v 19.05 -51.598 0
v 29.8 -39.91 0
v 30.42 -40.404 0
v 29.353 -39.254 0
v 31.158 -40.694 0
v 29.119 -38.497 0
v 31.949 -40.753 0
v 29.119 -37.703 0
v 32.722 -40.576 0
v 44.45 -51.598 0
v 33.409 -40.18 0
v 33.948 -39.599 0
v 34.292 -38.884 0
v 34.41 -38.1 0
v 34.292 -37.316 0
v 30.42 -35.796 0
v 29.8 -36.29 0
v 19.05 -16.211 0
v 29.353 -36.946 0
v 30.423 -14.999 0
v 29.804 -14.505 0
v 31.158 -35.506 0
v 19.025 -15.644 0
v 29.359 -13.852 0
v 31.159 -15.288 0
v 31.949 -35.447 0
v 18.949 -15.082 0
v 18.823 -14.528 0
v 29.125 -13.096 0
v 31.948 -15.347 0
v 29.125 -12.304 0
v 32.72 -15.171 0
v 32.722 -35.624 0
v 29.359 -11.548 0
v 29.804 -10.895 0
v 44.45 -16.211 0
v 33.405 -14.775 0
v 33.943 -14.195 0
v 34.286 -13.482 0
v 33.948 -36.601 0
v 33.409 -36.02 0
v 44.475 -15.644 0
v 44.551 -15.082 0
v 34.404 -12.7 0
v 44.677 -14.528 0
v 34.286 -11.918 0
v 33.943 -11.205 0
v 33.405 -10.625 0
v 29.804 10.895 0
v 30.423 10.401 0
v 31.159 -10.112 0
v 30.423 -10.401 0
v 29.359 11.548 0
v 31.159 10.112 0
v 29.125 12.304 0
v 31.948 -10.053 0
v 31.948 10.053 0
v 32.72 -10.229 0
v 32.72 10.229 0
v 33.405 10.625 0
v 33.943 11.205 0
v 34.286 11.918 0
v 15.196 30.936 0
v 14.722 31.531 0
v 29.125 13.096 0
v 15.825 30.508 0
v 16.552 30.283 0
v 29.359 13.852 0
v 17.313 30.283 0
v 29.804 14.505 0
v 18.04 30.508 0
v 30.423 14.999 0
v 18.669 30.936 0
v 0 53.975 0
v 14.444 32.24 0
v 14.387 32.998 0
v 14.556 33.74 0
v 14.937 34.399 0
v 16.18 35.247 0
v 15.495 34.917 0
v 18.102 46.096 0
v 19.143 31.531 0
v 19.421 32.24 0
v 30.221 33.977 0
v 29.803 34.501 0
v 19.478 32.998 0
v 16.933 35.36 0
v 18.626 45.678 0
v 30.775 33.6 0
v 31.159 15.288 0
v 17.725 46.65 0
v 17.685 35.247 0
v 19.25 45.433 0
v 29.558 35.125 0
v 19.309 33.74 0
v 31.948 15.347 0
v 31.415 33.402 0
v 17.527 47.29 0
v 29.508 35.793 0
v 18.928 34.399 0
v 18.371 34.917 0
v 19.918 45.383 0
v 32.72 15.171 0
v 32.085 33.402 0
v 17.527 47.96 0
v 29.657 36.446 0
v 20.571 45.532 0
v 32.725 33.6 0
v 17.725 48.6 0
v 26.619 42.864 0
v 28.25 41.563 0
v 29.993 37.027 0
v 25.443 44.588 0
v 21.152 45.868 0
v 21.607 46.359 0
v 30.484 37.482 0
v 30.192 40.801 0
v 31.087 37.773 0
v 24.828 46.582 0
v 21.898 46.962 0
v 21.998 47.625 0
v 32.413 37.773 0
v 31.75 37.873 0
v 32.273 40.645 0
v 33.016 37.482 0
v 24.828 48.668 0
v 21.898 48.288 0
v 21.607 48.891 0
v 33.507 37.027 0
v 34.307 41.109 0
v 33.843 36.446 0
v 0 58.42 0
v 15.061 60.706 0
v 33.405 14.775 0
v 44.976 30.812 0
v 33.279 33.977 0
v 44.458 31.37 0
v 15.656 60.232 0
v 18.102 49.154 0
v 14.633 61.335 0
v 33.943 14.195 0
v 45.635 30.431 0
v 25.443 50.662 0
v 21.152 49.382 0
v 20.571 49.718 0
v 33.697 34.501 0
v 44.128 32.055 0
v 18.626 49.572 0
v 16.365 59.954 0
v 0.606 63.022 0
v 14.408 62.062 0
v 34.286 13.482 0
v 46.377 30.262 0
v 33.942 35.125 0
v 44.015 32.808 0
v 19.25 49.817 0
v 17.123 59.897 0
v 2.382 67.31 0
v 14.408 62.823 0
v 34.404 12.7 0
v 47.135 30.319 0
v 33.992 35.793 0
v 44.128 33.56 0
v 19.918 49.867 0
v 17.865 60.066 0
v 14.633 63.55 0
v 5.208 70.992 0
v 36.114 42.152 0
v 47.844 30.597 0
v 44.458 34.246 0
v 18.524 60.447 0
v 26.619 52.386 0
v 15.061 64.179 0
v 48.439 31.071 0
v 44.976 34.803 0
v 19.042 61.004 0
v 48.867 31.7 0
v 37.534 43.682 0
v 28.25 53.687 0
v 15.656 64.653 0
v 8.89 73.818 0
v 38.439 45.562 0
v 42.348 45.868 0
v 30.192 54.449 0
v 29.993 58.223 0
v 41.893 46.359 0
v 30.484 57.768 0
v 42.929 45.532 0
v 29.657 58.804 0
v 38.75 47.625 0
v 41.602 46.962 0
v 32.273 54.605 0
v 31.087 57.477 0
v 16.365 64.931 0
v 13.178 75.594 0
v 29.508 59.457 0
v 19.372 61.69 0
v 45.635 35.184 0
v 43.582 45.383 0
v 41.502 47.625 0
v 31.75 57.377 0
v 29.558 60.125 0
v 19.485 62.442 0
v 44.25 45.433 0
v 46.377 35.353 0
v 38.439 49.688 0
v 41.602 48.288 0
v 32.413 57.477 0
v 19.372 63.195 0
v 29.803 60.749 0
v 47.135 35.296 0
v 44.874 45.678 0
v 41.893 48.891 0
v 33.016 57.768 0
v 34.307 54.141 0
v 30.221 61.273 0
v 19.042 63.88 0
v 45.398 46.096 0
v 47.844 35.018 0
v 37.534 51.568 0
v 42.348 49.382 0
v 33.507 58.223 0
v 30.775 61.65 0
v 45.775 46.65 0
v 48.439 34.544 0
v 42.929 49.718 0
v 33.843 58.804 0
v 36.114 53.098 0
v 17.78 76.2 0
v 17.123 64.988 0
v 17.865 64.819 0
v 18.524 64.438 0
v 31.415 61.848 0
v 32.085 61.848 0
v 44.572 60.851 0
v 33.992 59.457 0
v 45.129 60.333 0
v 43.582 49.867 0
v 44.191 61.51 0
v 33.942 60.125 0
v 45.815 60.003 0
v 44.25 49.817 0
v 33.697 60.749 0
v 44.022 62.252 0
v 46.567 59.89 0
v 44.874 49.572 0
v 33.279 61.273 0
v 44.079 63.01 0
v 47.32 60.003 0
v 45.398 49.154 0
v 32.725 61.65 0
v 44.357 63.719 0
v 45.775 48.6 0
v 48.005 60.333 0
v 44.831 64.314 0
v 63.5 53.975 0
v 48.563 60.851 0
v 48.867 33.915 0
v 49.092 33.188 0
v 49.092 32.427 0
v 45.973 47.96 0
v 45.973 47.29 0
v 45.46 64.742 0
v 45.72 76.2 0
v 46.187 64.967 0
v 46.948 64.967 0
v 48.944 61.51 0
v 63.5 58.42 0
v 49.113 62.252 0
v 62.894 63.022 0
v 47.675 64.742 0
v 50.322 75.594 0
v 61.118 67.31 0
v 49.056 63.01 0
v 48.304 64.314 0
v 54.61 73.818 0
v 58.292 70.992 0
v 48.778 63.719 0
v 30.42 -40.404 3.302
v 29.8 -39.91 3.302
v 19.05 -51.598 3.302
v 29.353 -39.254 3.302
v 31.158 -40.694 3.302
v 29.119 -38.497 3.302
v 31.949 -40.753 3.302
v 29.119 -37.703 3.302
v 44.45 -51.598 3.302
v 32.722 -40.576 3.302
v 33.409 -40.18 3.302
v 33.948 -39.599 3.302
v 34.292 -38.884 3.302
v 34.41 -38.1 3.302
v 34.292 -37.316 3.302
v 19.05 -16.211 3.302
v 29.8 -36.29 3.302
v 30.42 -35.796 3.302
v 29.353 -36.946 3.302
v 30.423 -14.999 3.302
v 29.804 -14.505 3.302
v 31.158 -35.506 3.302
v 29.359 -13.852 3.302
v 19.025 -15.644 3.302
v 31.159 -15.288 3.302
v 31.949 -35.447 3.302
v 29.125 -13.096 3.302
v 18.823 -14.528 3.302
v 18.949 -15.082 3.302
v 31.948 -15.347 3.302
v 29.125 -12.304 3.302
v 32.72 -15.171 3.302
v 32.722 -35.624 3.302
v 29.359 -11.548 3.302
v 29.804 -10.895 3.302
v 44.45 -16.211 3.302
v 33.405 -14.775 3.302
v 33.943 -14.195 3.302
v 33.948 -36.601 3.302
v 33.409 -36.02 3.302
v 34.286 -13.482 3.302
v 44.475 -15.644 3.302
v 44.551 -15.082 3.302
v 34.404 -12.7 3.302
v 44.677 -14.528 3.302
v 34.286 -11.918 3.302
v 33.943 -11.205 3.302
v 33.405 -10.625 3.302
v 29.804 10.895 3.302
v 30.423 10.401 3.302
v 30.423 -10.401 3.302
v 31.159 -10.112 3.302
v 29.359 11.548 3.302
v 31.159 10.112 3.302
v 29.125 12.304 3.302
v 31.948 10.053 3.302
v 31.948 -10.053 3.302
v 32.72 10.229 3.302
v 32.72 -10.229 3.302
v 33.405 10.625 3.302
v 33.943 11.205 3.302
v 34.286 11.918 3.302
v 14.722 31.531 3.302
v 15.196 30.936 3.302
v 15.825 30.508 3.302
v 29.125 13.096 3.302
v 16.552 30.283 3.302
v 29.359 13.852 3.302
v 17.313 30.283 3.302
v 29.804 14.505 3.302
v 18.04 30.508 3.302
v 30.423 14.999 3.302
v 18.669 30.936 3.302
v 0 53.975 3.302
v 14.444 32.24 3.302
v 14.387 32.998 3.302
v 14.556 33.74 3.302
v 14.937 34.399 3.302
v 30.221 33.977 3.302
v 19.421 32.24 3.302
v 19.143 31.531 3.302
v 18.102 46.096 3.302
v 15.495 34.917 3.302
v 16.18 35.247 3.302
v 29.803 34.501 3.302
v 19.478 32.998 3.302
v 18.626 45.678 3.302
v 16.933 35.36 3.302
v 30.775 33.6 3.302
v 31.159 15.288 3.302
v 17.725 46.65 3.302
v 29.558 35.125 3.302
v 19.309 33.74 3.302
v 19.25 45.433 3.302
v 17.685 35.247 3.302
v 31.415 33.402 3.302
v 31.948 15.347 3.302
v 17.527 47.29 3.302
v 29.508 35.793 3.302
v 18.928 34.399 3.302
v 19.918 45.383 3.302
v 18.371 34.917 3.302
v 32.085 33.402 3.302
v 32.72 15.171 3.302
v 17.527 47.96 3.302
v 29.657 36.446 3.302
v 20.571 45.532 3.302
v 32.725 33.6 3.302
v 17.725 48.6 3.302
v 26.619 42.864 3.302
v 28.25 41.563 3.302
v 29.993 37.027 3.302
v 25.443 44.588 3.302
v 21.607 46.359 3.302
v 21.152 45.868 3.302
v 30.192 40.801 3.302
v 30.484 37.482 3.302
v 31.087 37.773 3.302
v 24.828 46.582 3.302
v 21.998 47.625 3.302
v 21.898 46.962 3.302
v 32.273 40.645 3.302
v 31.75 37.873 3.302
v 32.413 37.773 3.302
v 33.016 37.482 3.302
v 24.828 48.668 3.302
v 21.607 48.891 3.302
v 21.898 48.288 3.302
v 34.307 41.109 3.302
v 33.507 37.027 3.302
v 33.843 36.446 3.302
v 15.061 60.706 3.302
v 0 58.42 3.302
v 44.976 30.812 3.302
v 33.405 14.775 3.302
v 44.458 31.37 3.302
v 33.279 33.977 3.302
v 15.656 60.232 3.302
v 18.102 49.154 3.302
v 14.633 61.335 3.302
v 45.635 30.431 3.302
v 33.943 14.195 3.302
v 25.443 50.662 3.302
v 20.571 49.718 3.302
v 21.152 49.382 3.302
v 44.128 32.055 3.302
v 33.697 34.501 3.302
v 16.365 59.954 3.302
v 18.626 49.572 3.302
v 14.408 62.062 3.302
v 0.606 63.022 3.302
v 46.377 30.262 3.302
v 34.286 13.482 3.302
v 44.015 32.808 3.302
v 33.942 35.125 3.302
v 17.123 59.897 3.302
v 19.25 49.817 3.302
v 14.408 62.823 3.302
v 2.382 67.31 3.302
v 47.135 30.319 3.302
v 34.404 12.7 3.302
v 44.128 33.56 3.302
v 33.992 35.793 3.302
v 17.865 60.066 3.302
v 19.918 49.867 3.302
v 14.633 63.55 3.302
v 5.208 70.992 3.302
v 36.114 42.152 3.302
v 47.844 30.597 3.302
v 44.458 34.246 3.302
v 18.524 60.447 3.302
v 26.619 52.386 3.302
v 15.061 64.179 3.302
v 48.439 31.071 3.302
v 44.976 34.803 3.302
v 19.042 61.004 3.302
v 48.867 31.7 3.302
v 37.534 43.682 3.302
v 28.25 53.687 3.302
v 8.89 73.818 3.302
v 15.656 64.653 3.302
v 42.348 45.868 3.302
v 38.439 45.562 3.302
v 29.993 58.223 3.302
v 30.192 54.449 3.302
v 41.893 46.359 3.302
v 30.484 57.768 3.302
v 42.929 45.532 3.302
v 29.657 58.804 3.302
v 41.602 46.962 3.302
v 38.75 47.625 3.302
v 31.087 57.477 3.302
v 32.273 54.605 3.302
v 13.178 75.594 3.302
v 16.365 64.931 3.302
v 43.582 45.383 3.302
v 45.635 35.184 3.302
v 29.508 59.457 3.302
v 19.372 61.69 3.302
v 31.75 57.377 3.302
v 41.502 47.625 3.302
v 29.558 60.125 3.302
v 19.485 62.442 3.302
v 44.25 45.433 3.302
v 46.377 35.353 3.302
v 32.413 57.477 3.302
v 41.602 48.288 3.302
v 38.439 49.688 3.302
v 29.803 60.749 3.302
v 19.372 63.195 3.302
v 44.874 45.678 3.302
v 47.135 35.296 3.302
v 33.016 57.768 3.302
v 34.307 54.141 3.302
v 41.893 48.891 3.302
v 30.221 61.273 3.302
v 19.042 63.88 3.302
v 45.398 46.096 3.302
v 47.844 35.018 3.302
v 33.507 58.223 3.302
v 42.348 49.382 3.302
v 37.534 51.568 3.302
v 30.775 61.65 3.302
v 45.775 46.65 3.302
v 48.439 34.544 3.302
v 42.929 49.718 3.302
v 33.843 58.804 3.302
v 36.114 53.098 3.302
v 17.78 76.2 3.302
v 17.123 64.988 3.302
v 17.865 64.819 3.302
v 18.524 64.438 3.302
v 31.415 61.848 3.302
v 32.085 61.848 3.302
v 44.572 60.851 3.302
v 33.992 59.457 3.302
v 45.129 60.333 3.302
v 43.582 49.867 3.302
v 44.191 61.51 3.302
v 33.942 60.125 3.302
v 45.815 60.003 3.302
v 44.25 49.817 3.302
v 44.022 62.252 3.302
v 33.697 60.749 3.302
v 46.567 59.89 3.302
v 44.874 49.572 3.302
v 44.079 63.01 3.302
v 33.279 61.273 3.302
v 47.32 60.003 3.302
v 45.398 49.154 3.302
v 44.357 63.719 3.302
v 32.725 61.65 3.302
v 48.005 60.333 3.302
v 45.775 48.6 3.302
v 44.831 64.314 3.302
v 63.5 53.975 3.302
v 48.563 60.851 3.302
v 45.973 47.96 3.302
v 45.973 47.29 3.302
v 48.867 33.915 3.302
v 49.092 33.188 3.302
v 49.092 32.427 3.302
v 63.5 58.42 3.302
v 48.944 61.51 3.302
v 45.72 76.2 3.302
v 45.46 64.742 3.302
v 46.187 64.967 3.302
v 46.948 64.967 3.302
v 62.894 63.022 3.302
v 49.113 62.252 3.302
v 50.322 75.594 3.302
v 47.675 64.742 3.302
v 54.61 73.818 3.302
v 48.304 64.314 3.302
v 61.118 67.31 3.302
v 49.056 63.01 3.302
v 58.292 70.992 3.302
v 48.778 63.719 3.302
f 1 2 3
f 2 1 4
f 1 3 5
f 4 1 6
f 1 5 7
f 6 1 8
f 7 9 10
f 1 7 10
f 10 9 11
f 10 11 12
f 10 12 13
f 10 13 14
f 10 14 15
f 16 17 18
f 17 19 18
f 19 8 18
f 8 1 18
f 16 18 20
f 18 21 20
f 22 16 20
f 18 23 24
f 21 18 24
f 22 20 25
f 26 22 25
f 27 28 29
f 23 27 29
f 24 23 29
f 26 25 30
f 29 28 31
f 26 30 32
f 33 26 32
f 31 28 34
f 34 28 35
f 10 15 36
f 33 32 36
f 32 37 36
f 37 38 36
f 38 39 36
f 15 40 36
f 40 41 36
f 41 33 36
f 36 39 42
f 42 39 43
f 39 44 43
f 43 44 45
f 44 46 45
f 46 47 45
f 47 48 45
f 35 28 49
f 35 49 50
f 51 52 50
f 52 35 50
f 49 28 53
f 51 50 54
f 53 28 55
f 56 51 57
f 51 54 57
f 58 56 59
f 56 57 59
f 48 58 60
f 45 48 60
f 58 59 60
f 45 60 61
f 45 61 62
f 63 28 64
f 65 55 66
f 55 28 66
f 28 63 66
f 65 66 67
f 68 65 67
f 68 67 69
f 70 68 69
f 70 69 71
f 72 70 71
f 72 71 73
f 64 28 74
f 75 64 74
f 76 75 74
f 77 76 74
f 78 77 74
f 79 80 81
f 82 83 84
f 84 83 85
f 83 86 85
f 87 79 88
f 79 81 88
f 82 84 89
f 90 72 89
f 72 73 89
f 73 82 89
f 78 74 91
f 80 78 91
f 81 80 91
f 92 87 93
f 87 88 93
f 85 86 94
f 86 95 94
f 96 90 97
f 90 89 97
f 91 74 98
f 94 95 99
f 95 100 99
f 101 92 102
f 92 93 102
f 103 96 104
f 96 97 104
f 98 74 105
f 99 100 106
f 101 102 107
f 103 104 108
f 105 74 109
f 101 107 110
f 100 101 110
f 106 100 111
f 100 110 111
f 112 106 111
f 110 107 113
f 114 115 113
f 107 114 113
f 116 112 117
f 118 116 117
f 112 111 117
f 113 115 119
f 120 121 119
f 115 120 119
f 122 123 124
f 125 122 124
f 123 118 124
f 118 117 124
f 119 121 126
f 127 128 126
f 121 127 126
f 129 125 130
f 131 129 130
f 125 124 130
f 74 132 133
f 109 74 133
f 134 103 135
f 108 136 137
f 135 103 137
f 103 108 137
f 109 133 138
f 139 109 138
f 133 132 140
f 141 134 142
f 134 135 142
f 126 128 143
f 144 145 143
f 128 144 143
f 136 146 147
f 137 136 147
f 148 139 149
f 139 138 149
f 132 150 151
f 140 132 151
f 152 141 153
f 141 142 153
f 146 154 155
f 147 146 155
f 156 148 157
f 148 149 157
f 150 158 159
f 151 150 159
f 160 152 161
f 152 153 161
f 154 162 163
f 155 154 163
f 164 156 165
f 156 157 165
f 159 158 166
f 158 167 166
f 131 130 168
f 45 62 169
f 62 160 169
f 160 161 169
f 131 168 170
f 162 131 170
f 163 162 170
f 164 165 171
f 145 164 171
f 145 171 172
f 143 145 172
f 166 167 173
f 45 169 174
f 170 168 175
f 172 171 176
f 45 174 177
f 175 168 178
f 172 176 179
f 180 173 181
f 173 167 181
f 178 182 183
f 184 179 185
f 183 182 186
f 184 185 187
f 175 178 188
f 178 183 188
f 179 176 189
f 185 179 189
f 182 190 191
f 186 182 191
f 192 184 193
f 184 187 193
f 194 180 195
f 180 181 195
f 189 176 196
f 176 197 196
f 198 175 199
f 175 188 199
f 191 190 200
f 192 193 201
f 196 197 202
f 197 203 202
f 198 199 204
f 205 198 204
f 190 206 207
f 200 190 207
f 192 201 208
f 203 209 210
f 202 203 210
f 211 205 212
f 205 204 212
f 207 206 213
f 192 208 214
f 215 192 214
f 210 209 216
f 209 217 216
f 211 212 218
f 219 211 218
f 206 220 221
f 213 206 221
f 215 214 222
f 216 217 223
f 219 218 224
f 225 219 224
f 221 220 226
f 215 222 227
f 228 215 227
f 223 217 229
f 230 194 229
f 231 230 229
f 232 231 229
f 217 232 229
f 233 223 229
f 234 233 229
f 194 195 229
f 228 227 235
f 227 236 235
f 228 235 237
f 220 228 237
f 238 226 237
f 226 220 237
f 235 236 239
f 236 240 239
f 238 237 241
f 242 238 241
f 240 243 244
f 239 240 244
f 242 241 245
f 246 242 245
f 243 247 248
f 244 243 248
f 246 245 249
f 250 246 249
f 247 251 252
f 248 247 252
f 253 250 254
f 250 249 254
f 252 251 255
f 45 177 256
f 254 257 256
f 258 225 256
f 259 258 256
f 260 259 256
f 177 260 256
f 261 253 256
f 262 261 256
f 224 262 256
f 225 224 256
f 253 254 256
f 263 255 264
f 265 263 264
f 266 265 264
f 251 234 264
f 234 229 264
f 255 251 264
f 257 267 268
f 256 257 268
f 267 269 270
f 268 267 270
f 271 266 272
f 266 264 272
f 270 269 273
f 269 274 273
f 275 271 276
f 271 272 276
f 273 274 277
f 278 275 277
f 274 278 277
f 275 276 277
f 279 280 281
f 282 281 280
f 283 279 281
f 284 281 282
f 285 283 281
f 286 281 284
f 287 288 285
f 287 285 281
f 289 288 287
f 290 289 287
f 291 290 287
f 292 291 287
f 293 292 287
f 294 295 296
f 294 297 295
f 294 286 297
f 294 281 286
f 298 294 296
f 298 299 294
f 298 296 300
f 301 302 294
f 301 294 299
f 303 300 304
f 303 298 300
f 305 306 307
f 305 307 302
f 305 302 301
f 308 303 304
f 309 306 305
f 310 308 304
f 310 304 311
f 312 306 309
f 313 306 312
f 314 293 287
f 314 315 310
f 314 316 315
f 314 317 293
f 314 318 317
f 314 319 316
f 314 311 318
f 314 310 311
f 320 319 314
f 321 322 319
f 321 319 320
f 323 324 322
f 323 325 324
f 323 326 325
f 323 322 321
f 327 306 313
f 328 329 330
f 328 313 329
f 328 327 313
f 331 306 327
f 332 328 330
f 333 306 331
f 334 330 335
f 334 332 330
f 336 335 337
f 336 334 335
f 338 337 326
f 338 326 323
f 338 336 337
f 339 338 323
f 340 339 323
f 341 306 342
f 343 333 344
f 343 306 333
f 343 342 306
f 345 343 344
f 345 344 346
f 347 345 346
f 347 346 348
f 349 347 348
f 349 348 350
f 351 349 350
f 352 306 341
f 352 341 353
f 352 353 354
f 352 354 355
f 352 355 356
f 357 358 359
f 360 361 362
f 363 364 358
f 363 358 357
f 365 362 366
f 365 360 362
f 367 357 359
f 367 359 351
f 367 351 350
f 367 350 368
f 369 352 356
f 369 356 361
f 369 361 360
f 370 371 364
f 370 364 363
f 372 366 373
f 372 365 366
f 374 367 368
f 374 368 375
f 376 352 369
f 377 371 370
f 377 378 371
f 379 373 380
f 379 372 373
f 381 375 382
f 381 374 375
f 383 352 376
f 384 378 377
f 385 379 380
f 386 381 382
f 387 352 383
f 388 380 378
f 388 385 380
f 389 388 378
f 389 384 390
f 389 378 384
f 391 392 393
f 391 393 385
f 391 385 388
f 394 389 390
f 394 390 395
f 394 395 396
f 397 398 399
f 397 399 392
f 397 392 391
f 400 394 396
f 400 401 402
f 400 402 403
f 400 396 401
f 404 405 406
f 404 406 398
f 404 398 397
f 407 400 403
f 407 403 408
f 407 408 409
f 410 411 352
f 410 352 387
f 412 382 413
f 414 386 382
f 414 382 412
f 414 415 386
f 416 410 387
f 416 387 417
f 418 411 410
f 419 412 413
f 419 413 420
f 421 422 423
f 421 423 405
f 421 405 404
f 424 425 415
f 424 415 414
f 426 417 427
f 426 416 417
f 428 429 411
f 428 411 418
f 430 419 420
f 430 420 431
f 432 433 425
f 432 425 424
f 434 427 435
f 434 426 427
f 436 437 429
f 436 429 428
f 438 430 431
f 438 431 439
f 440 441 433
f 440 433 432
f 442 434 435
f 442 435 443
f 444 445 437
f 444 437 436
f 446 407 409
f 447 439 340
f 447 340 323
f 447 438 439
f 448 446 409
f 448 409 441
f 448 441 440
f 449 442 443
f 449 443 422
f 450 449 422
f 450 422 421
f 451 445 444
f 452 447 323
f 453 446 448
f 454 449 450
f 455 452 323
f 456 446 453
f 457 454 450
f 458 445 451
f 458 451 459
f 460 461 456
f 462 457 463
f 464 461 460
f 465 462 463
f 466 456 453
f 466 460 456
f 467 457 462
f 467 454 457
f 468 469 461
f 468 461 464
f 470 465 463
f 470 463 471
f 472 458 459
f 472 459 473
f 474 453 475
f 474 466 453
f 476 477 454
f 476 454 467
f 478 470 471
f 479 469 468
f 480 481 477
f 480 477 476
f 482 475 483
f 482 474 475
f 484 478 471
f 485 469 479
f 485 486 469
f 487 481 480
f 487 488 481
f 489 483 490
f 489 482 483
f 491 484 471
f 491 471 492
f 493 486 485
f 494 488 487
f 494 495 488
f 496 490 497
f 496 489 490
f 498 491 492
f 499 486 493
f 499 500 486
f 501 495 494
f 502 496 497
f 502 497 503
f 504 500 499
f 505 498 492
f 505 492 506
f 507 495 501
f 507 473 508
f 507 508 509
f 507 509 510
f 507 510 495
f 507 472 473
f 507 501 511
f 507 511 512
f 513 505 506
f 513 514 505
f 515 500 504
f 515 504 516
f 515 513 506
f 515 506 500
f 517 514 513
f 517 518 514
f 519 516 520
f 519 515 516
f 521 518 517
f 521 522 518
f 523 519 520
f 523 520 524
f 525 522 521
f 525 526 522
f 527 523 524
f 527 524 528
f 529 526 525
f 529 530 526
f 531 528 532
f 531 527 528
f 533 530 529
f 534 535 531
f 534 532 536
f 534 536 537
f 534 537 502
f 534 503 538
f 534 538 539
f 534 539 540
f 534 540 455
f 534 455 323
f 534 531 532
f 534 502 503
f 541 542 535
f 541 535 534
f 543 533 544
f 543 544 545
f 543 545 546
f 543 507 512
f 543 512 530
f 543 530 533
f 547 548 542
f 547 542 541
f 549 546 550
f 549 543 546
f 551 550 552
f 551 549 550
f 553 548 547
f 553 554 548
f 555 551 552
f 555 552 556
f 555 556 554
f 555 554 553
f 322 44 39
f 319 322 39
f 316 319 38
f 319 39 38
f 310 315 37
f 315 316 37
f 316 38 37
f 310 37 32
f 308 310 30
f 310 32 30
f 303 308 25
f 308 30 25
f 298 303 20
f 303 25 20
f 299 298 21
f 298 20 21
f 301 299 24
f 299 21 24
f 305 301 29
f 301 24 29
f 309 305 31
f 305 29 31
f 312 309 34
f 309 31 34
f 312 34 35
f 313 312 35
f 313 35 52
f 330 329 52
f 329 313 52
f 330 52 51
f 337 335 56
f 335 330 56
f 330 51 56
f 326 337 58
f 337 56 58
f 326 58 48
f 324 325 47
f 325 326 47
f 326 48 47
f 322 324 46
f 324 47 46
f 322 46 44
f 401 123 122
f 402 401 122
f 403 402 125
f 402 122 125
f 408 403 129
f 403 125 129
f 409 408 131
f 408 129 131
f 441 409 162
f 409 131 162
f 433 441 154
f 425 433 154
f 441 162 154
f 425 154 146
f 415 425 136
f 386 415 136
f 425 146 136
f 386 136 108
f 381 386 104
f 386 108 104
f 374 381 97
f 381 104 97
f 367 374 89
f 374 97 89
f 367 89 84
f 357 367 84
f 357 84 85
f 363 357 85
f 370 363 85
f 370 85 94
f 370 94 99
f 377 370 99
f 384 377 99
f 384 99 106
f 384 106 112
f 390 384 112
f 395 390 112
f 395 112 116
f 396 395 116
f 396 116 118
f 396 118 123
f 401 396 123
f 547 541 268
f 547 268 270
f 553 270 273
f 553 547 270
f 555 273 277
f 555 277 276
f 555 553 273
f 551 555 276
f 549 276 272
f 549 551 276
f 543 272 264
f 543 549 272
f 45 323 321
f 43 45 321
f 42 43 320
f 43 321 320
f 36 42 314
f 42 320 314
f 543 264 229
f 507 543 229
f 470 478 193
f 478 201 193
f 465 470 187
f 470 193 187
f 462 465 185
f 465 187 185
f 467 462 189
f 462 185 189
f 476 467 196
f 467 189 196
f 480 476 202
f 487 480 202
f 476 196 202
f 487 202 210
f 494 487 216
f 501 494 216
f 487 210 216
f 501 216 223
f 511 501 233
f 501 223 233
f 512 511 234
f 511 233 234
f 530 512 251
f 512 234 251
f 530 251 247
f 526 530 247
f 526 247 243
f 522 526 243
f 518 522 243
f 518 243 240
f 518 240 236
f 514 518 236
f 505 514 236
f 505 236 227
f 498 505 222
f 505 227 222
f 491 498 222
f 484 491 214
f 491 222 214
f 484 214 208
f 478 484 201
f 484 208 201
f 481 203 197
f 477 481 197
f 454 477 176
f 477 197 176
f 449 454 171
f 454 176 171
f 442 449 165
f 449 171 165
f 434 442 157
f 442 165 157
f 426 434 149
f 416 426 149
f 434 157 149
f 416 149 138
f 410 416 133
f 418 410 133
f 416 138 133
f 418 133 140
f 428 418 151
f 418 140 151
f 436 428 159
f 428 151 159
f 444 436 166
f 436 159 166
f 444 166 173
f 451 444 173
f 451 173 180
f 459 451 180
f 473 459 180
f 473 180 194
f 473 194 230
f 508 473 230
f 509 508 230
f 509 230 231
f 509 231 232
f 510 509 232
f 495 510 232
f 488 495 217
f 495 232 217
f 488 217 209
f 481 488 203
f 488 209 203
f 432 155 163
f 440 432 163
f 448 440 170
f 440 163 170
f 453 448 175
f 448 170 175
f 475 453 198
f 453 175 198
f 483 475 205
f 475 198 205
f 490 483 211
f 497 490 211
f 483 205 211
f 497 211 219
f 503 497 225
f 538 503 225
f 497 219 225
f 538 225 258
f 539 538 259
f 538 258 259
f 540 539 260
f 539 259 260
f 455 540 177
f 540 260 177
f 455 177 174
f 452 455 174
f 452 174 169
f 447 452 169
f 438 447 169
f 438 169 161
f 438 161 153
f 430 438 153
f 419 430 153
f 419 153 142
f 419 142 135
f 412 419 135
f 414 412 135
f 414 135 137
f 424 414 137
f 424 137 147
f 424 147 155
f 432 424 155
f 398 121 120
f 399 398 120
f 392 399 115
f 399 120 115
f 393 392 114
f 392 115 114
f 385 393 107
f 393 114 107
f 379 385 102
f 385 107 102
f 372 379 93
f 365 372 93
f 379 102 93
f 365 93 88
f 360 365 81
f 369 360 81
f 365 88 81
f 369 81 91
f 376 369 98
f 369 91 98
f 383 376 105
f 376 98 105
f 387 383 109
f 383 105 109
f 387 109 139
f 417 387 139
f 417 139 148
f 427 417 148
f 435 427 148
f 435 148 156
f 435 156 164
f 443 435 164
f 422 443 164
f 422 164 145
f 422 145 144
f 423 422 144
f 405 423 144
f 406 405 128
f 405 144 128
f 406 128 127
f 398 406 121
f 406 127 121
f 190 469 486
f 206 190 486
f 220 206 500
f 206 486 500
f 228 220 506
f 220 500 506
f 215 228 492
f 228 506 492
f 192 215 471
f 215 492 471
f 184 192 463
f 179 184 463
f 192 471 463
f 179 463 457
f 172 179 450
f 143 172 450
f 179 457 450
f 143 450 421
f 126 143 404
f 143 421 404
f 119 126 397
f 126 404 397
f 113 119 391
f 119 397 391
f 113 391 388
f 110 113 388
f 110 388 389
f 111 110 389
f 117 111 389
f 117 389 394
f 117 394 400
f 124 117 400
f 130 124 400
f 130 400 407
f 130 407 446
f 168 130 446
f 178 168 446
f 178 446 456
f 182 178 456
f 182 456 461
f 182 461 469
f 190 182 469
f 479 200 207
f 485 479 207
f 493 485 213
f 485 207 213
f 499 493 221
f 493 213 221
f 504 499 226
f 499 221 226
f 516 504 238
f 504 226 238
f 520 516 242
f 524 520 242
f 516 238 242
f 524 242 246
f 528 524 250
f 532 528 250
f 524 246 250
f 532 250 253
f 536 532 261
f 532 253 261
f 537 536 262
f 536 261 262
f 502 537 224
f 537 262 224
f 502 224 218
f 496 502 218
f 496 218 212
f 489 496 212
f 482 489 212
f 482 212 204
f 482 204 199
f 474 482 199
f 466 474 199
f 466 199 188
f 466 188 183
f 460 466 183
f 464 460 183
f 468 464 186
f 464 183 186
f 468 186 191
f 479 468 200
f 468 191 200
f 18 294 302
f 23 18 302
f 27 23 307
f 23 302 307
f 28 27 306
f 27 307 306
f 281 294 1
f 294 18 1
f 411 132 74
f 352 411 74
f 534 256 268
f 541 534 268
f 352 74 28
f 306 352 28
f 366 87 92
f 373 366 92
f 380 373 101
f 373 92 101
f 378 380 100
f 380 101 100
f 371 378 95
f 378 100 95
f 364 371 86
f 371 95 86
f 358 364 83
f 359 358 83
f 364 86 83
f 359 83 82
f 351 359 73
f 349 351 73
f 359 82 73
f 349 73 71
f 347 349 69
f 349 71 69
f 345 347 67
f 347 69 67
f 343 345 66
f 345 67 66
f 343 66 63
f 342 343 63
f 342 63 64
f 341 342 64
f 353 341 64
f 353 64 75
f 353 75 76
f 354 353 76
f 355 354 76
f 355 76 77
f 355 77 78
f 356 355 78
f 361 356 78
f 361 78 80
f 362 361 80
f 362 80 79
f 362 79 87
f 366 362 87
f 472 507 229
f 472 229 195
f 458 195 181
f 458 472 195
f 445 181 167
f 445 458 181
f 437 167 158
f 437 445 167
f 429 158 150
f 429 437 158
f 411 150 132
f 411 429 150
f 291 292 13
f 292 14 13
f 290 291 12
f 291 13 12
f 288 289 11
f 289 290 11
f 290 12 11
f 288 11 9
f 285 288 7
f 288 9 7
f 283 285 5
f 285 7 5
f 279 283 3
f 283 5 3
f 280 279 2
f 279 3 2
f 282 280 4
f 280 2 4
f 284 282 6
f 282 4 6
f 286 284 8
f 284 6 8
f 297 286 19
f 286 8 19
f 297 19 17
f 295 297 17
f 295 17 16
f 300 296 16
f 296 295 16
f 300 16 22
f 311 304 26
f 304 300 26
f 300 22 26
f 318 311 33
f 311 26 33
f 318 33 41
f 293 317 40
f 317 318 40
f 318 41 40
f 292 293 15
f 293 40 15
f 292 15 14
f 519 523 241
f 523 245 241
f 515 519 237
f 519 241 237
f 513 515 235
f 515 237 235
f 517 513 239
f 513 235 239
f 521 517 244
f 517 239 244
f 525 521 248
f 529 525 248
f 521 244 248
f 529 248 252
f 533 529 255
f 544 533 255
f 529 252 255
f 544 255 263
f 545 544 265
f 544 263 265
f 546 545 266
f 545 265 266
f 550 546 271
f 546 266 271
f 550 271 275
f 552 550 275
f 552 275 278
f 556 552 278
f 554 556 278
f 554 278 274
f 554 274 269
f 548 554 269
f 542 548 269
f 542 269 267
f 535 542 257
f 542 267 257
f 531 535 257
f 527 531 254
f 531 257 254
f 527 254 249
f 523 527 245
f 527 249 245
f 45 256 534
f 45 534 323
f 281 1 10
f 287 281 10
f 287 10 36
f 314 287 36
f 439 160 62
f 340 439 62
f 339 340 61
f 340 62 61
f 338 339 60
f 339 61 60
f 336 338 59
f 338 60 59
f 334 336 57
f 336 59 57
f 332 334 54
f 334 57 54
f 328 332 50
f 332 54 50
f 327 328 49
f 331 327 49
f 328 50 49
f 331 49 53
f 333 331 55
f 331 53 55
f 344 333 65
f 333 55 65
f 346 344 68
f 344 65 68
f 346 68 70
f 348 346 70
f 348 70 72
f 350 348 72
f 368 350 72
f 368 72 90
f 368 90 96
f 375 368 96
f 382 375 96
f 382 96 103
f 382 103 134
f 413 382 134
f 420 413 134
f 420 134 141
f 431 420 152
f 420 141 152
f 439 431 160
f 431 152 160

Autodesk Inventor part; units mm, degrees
ref_plane "YZ Plane" through (0, 0, 0) normal (1, 0, 0) x (0, 1, 0)
ref_plane "XZ Plane" through (0, 0, 0) normal (0, 1, 0) x (-1, 0, 0)
ref_plane "XY Plane" through (0, 0, 0) normal (0, 0, 1) x (1, 0, 0)
sketch "Sketch1" plane through (0, 0, 0) normal (0, 0, 1) x (1, 0, 0)
  line L0 (63.5, 76.2) -> (0, 76.2)
  line L1 (0, 76.2) -> (0, 53.975)
  circle A0 centre (31.75, 47.625) radius 4.05
  line L2 (19.05, -6.35) -> (44.45, -6.35)
  line L3 (63.5, 53.975) -> (63.5, 76.2)
  line L4 (31.75, 76.2) -> (31.75, -6.35)
  circle A1 centre (31.75, 12.7) radius 2.6543
  circle A2 centre (31.75, -12.7) radius 2.6543
  circle A3 centre (31.75, -38.1) radius 2.6604
  line L5 (63.5, 53.975) -> (63.5, -6.35)
  line L6 (63.5, -6.35) -> (0, -6.35)
  line L7 (0, -6.35) -> (0, 53.975)
  line L8 (19.05, -15.3543) -> (19.05, -51.598)
  line L9 (19.05, -51.598) -> (44.45, -51.598)
  line L10 (44.45, -51.598) -> (44.45, -15.3543)
  line L11 (63.5, 53.975) -> (44.45, -15.3543)
  line L12 (0, 53.975) -> (19.05, -15.3543)
  point P0 (0, 0)
  dimension "d0" = 63.5
  dimension "d2" = 8.1
  dimension "d5" = 28.575
  dimension "d50" = 82.55
  dimension "d54" = 5.3086
  dimension "d55" = 63.5
  dimension "d59" = 25.4
  dimension "d60" = 25.4
  dimension "d61" = 25.4
extrude "Extrusion1" add sketch "Sketch1" along normal blind 3.302 contours L3 L11 L6 L2 L4 A1 A0 L0 | L4 A0 A1 L2 L6 L12 L1 L0 | L11 L10 L9 L8 L12 L6 L2
fillet "Fillet11" radius 17.78 1 edges at (63.5, 76.2, 1.651)
fillet "Fillet12" radius 17.78 1 edges at (0, 76.2, 1.651)
sketch "Sketch3" plane through (0, 0, 3.302) normal (0, 0, 1) x (1, 0, 0)
  circle A0 centre (31.75, 47.625) radius 4.05 projected
  circle A1 centre (31.75, 47.625) radius 16
  circle A2 centre (31.75, 47.625) radius 8
  circle A3 centre (31.75, 47.625) radius 12
  line L0 (31.75, 47.625) -> (31.75, 69.8383)
  line L1 (31.75, 47.625) -> (53.9633, 47.625) construction
  point P0 (0, 0)
  point P1 (31.75, 59.625)
  dimension "d28" = 24
  dimension "d26" = 32
  dimension "d27" = 16
  dimension "d36" = 90
hole "Hole1" at (31.75, 59.625, 3.302) direction (0, 0, -1) diameter 4.4958 depth 14.1986 tip angle 118 clearance for "Flat Head Machine Screw" size "M4" standard "Ansi Metric M Profile"
pattern_circular "Circular Pattern1" count 4 over 360 about axis through (31.75, 47.625, 0) along (0, 0, 1) of "Hole1"
sketch "Sketch4" plane through (0, 0, 3.302) normal (0, 0, 1) x (1, 0, 0)
  circle A0 centre (31.75, 47.625) radius 4.05 projected
  circle A1 centre (31.75, 47.625) radius 12
  circle A2 centre (31.75, 47.625) radius 16
  circle A3 centre (31.75, 47.625) radius 20.955
  line L0 (45.72, 76.2) -> (17.78, 76.2) projected
  line L1 (31.75, 47.625) -> (51.1677, 67.0427)
  line L2 (31.75, 47.625) -> (59.2107, 47.625) construction
  point P0 (0, 0)
  point P1 (46.5674, 62.4424)
  dimension "d42" = 41.91
  dimension "d40" = 24
  dimension "d41" = 32
  dimension "d58" = 45
hole "Hole2" at (46.5674, 62.4424, 3.302) direction (0, 0, -1) diameter 5.1054 depth 16.256 tip angle 118 clearance for "Flat Head Machine Screw (82)" size "#10" standard "Ansi Unified Screw Threads"
pattern_circular "Circular Pattern2" count 4 over 360 about axis through (31.75, 47.625, 0) along (0, 0, 1) of "Hole2"
fillet "Fillet16" radius 6.35 2 edges at (44.45, -15.3543, 1.651) (19.05, -15.3543, 1.651)
sketch "Sketch5" plane through (0, 0, 3.302) normal (0, 0, 1) x (1, 0, 0)
  circle A0 centre (31.75, 47.625) radius 4.05 projected
  circle A1 centre (31.75, 47.625) radius 7
  point P0 (0, 0)
  dimension "d64" = 14
extrude "Extrusion2" cut sketch "Sketch5" against normal blind 25.4 contours A0 | A1
equation "\"d54\" = d3"
equation "\"d3\" = 5.3086"
properties part number "Arm Plate3"
